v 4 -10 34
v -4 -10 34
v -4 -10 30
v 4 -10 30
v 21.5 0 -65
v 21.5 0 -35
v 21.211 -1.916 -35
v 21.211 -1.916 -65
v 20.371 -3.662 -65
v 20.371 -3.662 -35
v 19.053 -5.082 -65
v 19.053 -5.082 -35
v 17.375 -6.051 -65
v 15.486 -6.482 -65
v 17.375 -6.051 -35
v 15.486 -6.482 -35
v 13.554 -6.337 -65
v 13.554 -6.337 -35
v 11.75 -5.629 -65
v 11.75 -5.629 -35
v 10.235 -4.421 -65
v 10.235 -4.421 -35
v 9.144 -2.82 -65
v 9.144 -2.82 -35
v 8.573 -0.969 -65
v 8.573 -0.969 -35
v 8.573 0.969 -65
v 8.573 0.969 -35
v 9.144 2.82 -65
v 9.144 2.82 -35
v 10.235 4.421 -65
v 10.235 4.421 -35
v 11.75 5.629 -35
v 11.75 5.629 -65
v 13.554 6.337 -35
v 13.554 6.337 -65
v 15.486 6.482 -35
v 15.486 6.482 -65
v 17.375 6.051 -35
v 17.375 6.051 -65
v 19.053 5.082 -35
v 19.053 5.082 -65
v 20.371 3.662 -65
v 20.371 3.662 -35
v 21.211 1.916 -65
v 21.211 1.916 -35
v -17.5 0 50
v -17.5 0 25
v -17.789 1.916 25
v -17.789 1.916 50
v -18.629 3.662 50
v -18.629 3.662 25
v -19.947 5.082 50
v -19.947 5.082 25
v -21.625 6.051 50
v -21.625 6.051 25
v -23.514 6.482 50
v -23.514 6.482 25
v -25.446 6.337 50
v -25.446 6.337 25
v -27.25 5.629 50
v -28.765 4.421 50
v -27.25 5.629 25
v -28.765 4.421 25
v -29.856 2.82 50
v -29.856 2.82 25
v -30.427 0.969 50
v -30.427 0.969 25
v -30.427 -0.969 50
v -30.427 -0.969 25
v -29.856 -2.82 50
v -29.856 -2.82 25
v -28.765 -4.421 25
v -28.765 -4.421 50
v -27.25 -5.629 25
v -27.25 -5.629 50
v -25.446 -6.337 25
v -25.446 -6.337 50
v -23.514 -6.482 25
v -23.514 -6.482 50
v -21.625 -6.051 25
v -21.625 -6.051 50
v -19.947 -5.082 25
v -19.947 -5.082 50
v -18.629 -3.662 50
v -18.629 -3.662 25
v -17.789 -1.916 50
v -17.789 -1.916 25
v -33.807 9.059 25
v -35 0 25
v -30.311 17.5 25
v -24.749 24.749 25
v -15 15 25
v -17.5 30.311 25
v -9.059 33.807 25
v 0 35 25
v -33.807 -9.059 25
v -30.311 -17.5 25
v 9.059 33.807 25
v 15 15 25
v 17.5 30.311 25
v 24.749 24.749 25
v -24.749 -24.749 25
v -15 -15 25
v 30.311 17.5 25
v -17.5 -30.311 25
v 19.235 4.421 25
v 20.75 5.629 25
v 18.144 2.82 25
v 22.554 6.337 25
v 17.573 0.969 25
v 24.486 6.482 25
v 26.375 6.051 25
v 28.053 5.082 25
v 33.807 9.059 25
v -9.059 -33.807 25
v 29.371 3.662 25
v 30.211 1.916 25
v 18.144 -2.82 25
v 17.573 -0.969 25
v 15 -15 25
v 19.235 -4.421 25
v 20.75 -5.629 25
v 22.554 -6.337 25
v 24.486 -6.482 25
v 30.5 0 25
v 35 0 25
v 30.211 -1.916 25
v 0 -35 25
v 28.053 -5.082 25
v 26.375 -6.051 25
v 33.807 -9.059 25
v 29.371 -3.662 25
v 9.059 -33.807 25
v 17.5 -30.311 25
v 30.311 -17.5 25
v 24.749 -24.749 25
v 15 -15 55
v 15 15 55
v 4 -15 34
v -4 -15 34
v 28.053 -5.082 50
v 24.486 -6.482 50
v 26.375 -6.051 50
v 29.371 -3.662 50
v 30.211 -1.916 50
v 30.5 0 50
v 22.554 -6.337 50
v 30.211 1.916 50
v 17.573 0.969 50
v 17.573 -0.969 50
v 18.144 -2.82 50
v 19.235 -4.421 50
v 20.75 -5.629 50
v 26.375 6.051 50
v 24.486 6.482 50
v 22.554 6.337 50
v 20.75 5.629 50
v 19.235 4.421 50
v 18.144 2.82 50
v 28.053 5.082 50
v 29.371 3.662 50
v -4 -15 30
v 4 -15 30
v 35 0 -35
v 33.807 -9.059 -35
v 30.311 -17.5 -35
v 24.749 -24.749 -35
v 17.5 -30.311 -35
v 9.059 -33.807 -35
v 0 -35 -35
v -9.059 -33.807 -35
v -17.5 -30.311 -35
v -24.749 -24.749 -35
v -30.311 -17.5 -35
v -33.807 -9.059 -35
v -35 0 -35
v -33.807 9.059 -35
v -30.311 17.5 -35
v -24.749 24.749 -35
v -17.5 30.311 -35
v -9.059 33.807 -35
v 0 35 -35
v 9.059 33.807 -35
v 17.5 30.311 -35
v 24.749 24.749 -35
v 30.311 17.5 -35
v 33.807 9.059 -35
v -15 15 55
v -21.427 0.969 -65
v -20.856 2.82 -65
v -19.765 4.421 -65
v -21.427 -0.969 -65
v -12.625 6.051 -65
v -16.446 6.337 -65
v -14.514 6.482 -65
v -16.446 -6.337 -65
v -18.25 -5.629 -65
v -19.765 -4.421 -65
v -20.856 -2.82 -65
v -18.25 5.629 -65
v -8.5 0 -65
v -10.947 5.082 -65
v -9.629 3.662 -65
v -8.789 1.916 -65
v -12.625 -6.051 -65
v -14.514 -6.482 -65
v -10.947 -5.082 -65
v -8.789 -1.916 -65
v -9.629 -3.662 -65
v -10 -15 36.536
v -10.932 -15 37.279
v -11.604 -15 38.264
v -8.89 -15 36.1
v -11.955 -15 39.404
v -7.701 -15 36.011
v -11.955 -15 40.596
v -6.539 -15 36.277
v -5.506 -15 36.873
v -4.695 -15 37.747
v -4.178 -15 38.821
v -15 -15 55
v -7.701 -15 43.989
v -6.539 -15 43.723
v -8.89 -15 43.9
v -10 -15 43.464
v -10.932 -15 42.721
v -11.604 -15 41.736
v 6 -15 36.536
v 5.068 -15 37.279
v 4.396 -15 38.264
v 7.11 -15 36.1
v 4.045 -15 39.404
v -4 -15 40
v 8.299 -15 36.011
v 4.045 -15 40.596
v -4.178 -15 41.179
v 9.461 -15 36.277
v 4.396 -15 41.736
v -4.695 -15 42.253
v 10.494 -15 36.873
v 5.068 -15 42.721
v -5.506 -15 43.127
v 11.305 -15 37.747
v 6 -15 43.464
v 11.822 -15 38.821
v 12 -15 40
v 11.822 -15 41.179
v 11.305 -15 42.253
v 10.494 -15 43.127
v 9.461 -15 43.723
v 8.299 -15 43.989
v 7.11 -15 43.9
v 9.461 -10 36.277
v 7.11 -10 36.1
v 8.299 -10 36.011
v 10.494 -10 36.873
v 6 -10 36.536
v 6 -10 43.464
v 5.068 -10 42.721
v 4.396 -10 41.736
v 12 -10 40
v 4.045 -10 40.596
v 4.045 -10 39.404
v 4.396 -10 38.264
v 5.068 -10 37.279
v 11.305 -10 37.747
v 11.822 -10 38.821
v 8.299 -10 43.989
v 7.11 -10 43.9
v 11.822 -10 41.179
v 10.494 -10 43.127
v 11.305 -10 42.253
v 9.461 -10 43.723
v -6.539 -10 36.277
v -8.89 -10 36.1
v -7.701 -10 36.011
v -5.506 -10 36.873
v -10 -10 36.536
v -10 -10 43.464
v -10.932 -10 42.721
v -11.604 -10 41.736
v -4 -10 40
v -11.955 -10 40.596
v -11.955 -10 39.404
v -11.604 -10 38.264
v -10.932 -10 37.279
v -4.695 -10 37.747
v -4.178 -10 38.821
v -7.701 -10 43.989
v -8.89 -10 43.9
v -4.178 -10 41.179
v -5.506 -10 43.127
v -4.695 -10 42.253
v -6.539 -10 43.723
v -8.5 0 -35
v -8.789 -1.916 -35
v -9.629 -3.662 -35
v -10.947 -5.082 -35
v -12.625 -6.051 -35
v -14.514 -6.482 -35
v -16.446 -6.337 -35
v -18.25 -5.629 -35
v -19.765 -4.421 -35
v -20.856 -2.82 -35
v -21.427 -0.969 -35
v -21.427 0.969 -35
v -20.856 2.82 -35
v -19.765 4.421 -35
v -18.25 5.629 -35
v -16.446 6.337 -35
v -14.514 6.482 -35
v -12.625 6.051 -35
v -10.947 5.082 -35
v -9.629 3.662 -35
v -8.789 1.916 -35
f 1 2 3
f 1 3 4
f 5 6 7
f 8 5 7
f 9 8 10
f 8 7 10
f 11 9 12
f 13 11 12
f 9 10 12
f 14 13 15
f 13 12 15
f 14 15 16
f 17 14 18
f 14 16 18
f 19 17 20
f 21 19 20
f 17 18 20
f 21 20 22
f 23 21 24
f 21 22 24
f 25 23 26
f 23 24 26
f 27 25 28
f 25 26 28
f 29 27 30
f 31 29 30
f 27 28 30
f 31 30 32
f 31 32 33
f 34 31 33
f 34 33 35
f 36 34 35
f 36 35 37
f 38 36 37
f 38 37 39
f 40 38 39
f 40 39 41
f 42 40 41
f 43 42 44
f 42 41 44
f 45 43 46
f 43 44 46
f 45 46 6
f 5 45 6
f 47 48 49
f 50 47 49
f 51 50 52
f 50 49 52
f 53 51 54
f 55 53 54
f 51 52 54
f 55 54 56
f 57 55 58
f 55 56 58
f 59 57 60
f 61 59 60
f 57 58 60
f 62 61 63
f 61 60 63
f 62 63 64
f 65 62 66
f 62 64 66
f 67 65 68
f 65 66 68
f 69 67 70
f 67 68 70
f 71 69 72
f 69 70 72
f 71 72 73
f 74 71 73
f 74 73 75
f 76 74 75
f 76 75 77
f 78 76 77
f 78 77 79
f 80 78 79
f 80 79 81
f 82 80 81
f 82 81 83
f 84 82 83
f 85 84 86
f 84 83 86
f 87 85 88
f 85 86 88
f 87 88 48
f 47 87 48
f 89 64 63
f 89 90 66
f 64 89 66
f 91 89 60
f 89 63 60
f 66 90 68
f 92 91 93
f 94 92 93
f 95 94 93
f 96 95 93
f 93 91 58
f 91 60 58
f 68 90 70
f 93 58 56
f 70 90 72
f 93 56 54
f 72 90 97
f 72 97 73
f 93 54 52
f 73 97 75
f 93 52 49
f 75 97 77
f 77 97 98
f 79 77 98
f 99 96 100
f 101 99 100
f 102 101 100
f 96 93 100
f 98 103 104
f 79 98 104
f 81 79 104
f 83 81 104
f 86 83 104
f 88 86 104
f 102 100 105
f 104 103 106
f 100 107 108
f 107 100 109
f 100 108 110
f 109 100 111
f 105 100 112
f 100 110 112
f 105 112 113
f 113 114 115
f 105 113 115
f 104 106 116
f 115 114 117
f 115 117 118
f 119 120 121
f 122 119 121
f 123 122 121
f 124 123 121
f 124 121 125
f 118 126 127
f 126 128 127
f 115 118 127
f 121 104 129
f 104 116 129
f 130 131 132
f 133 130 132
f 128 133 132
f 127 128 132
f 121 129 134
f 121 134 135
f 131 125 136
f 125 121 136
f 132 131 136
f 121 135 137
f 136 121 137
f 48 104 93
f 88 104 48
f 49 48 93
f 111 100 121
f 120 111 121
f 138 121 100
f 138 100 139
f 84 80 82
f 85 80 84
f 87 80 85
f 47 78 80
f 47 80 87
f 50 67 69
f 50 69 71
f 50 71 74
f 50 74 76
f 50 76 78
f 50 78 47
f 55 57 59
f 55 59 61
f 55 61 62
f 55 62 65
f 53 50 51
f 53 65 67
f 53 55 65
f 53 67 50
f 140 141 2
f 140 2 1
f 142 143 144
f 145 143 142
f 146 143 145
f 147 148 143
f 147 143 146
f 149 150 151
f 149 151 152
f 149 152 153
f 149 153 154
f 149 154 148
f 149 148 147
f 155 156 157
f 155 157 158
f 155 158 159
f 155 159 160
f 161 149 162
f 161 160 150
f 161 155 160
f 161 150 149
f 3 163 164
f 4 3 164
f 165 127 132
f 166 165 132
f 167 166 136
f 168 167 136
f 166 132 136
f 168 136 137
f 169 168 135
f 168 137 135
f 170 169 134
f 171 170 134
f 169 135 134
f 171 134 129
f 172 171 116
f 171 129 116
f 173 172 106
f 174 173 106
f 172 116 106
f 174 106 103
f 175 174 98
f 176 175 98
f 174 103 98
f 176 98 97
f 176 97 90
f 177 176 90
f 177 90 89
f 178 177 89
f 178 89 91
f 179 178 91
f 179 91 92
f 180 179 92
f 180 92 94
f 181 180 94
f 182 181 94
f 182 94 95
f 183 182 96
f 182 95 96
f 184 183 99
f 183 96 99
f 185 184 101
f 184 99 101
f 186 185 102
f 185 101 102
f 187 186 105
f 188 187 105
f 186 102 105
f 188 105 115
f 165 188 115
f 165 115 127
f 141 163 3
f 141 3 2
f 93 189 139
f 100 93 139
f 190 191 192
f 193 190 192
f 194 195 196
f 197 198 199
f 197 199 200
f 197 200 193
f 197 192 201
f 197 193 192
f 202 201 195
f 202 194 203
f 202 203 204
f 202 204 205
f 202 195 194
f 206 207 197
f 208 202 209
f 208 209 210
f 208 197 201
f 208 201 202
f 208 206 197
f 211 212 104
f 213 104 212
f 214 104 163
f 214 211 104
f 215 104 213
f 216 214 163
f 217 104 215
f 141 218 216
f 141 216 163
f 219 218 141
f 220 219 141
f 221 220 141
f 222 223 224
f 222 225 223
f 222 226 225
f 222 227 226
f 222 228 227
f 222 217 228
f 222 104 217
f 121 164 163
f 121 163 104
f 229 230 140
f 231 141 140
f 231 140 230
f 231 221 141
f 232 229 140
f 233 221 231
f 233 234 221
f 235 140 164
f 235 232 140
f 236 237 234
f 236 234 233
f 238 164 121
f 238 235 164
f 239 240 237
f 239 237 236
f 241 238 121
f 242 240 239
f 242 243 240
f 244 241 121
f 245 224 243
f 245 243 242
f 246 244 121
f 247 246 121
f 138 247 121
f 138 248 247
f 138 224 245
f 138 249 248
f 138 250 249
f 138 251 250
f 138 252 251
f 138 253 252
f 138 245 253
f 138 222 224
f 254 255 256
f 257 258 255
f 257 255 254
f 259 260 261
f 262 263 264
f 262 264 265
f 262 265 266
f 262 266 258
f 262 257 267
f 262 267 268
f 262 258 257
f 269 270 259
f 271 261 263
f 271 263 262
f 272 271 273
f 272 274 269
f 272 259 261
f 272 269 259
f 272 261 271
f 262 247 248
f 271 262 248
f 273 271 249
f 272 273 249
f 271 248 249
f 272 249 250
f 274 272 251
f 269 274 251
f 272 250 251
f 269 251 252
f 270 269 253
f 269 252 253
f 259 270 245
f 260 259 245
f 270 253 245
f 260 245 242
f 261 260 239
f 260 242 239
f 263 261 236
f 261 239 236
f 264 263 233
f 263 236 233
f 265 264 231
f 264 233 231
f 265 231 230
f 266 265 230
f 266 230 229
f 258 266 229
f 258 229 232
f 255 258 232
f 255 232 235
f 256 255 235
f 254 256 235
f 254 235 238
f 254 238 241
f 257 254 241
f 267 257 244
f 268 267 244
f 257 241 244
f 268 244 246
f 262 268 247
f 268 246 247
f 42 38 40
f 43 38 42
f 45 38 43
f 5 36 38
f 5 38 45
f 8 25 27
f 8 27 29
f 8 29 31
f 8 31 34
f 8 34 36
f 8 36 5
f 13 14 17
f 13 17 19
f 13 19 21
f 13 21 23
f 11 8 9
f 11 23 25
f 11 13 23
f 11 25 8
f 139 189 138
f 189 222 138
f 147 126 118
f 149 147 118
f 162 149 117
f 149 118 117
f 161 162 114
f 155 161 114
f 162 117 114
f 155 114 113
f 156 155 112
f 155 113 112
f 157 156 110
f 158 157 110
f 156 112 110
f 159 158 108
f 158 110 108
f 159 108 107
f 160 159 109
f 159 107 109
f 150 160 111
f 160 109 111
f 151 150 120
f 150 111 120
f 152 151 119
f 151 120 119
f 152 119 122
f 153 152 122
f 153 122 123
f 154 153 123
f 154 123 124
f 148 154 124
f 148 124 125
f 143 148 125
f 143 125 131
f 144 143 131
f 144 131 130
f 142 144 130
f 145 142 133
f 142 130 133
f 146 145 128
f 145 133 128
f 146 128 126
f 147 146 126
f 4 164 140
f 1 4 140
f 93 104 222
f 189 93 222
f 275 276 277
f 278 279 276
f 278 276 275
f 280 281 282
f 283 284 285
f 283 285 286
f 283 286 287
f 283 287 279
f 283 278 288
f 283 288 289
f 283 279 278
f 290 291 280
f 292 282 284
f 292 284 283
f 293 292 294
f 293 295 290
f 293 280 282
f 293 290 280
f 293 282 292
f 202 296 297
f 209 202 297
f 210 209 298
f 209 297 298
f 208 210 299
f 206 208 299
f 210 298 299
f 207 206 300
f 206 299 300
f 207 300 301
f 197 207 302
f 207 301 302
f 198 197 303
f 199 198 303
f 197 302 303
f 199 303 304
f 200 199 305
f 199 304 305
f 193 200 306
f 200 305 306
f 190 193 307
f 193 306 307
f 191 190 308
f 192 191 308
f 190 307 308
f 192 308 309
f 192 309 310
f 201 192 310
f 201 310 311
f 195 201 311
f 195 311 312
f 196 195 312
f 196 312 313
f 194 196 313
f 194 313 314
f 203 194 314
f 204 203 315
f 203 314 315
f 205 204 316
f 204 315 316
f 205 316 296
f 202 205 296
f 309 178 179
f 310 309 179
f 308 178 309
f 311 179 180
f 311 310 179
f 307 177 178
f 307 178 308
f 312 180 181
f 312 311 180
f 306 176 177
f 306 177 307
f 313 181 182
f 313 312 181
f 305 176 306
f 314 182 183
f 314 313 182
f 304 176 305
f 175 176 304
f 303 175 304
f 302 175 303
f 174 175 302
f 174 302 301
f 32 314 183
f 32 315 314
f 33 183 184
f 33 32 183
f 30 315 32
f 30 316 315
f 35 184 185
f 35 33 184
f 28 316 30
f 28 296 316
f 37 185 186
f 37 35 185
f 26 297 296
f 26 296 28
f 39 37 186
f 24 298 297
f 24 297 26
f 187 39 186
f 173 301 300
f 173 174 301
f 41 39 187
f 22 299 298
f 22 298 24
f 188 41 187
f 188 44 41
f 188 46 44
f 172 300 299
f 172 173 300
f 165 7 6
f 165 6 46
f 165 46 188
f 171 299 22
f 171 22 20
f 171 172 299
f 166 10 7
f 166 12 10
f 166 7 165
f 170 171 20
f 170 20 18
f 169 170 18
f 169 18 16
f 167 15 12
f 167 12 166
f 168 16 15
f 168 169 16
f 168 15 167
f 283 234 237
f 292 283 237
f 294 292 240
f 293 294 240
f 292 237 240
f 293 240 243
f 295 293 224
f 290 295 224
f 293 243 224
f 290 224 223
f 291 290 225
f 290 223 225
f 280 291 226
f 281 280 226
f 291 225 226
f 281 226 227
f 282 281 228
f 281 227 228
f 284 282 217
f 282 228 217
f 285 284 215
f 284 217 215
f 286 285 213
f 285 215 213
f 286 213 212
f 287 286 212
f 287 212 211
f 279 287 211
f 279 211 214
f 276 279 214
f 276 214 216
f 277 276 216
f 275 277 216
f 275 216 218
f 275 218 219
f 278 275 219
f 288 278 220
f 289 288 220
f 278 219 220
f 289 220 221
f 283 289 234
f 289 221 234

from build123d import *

# Parameters (mm, degrees)
F0_W     = 30
F0_H     = 30
F1_DEPTH = 15
F2_R     = 35
F3_DEPTH = 60
F4_R     = 6.5
F5_DEPTH = 30
F6_R     = 4
F6_W     = 8
F6_H     = 4
F7_DEPTH = 5
F8_R     = 6.5
F9_DEPTH = 25


with BuildPart() as f1:
    # F0 (on Front) → F1 (new body, symmetric)
    with BuildSketch(Plane.XZ):
        with Locations((0, 40)):
            Rectangle(F0_W, F0_H)
    extrude(amount=F1_DEPTH, both=True)

    # F2 (on face) → F3 (join)
    with BuildSketch(Plane(origin=(0, 0, 25), x_dir=(1, 0, 0), z_dir=(0, 0, -1))):
        Circle(F2_R)
    extrude(amount=F3_DEPTH)

    # F4 (on face) → F5 (join)
    with BuildSketch(Plane(origin=(0, 0, -35), x_dir=(1, 0, 0), z_dir=(0, 0, -1))):
        with Locations((-15, 0)):
            Circle(F4_R)
        with Locations((15, 0)):
            Circle(F4_R)
    extrude(amount=F5_DEPTH)

    # F6 (on face) → F7 (cut)
    with BuildSketch(Plane.XZ.offset(15)):
        with Locations((-8, 40)):
            Circle(F6_R)
        with Locations((8, 40)):
            Circle(F6_R)
        with Locations((0, 32)):
            Rectangle(F6_W, F6_H)
    extrude(amount=-F7_DEPTH, mode=Mode.SUBTRACT)

    # F8 (on face) → F9 (join)
    with BuildSketch(Plane.XY.offset(25)):
        with Locations((-24, 0)):
            Circle(F8_R)
        with Locations((24, 0)):
            Circle(F8_R)
    extrude(amount=F9_DEPTH)


solid = f1.part
